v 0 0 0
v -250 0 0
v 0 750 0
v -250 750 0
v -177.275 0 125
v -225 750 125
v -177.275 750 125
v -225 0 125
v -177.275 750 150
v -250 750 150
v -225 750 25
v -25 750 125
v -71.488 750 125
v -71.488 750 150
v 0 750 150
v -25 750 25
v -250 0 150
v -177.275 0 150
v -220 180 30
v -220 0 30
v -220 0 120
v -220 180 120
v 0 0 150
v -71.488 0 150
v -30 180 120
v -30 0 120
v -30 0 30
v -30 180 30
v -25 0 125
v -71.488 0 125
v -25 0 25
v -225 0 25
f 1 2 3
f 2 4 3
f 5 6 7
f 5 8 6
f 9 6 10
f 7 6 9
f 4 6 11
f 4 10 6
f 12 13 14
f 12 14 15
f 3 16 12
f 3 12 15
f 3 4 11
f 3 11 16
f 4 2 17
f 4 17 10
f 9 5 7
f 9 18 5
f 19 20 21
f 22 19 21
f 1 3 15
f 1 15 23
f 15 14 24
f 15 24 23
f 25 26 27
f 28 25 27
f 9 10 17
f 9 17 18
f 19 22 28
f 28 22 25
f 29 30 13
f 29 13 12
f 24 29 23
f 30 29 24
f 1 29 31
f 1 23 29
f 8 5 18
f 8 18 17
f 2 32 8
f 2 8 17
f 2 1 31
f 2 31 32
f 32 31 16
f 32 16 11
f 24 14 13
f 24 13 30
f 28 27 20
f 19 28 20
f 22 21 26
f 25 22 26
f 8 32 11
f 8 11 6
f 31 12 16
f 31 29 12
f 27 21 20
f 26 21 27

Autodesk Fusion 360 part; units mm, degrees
sketch "Sketch4" plane through (0, 0, 0) normal (0, 0, 1) x (1, 0, 0)
  line L0 (0, 0) -> (-250, 0)
  line L1 (-250, 0) -> (-250, 750)
  line L2 (-250, 750) -> (0, 750)
  line L3 (0, 750) -> (0, 0)
extrude "Extrude1" add sketch "Sketch4" along normal blind 150 makes body 1
sketch "Sketch5" plane through (0, 0, 0) normal (0, -1, 0) x (1, 0, 0)
  line L0 (-250, 0) -> (0, 0)
  line L1 (0, 0) -> (0, 150)
  line L2 (0, 150) -> (-250, 150)
  line L3 (-250, 150) -> (-250, 0)
  line L4 (-225, 125) -> (-25, 125)
  line L5 (-25, 125) -> (-25, 25)
  line L6 (-25, 25) -> (-225, 25)
  line L7 (-225, 25) -> (-225, 125)
extrude "Extrude2" cut sketch "Sketch5" against normal blind 850 contours L4 L5 L6 L7 bodies 1
sketch "Sketch6" plane through (0, 0, 150) normal (0, 0, 1) x (-1, 0, 0)
  line L0 (0, -750) -> (250, -750)
  line L1 (250, -750) -> (250, 0)
  line L2 (250, 0) -> (0, 0)
  line L3 (0, 0) -> (0, -750)
  line L4 (177.2752, -750) -> (71.4878, -750)
  line L5 (71.4878, -750) -> (71.4878, 0)
  line L6 (71.4878, 0) -> (177.2752, 0)
  line L7 (177.2752, 0) -> (177.2752, -750)
extrude "Extrude3" cut sketch "Sketch6" against normal blind 50 contours L0 L2 L4 L5 L6 L7 bodies 1
sketch "Sketch7" plane through (0, 0, 0) normal (0, -1, 0) x (1, 0, 0)
  line L0 (-177.2752, 125) -> (-177.2752, 150)
  line L1 (-177.2752, 150) -> (-250, 150)
  line L2 (-250, 150) -> (-250, 0)
  line L3 (-250, 0) -> (0, 0)
  line L4 (0, 0) -> (0, 150)
  line L5 (0, 150) -> (-71.4878, 150)
  line L6 (-71.4878, 150) -> (-71.4878, 125)
  line L7 (-71.4878, 125) -> (-25, 125)
  line L8 (-25, 125) -> (-25, 25)
  line L9 (-25, 25) -> (-225, 25)
  line L10 (-225, 25) -> (-225, 125)
  line L11 (-225, 125) -> (-177.2752, 125)
  line L12 (-220, 120) -> (-30, 120)
  line L13 (-30, 120) -> (-30, 30)
  line L14 (-30, 30) -> (-220, 30)
  line L15 (-220, 30) -> (-220, 120)
extrude "Extrude4" add sketch "Sketch7" against normal blind 180 separate body contours L12 L13 L14 L15 makes body 2
copy_body "Body->Comp1" bodies 1 removing the originals makes body 3 in component "Component"
copy_body "Body->Comp2" bodies 2 removing the originals makes body 4 in component "Component'"
component "Component" placed x (1, 0, 0) y (0, 1, 0) z (0, 0, 1) at (0, 0, 0)
component "Component'" placed x (1, 0, 0) y (0, 1, 0) z (0, 0, 1) at (0, 0, 0)
